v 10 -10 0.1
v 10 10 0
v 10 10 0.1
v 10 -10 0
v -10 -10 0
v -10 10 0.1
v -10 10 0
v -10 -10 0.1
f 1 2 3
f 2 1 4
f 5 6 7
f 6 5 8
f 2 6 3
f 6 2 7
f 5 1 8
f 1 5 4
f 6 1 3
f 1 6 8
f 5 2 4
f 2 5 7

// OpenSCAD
// file: ../openscad/inspection.scad
// Domain-independent OpenSCAD inspection helpers.
//
// Public API:
//   util_section_inspect(axis, position, depth, direction)
//
// All dimensional values are millimetres.

module _util_section_slab(
    axis,
    position,
    depth,
    direction
) {
    span = 1000000;
    positive = direction == "Positive";

    if (axis == "X")
        translate([
            positive ? position : position - depth,
            -span / 2,
            -span / 2
        ])
            cube([depth, span, span]);
    else if (axis == "Y")
        translate([
            -span / 2,
            positive ? position : position - depth,
            -span / 2
        ])
            cube([span, depth, span]);
    else if (axis == "Z")
        translate([
            -span / 2,
            -span / 2,
            positive ? position : position - depth
        ])
            cube([span, span, depth]);
}

module util_section_inspect(
    axis = "None",
    position = 0,
    depth = 10,
    direction = "Positive"
) {
    assert(
        axis == "None" || axis == "X" || axis == "Y" || axis == "Z",
        str("util_section_inspect(): unsupported axis: ", axis)
    );

    if (axis == "None") {
        children();
    } else {
        assert(
            direction == "Positive" || direction == "Negative",
            str("util_section_inspect(): unsupported direction: ", direction)
        );
        assert(
            depth >= 0.1,
            str("util_section_inspect(): depth must be at least 0.1 mm, got ", depth)
        );

        intersection() {
            children();
            _util_section_slab(
                axis = axis,
                position = position,
                depth = depth,
                direction = direction
            );
        }
    }
}
// main file
use <../openscad/inspection.scad>

test_axis = is_undef(test_axis) ? "Z" : test_axis;
test_position = is_undef(test_position) ? 0 : test_position;
test_depth = is_undef(test_depth) ? 0.1 : test_depth;
test_direction = is_undef(test_direction) ? "Positive" : test_direction;

util_section_inspect(
    axis = test_axis,
    position = test_position,
    depth = test_depth,
    direction = test_direction
)
    cube([20, 20, 20], center = true);
